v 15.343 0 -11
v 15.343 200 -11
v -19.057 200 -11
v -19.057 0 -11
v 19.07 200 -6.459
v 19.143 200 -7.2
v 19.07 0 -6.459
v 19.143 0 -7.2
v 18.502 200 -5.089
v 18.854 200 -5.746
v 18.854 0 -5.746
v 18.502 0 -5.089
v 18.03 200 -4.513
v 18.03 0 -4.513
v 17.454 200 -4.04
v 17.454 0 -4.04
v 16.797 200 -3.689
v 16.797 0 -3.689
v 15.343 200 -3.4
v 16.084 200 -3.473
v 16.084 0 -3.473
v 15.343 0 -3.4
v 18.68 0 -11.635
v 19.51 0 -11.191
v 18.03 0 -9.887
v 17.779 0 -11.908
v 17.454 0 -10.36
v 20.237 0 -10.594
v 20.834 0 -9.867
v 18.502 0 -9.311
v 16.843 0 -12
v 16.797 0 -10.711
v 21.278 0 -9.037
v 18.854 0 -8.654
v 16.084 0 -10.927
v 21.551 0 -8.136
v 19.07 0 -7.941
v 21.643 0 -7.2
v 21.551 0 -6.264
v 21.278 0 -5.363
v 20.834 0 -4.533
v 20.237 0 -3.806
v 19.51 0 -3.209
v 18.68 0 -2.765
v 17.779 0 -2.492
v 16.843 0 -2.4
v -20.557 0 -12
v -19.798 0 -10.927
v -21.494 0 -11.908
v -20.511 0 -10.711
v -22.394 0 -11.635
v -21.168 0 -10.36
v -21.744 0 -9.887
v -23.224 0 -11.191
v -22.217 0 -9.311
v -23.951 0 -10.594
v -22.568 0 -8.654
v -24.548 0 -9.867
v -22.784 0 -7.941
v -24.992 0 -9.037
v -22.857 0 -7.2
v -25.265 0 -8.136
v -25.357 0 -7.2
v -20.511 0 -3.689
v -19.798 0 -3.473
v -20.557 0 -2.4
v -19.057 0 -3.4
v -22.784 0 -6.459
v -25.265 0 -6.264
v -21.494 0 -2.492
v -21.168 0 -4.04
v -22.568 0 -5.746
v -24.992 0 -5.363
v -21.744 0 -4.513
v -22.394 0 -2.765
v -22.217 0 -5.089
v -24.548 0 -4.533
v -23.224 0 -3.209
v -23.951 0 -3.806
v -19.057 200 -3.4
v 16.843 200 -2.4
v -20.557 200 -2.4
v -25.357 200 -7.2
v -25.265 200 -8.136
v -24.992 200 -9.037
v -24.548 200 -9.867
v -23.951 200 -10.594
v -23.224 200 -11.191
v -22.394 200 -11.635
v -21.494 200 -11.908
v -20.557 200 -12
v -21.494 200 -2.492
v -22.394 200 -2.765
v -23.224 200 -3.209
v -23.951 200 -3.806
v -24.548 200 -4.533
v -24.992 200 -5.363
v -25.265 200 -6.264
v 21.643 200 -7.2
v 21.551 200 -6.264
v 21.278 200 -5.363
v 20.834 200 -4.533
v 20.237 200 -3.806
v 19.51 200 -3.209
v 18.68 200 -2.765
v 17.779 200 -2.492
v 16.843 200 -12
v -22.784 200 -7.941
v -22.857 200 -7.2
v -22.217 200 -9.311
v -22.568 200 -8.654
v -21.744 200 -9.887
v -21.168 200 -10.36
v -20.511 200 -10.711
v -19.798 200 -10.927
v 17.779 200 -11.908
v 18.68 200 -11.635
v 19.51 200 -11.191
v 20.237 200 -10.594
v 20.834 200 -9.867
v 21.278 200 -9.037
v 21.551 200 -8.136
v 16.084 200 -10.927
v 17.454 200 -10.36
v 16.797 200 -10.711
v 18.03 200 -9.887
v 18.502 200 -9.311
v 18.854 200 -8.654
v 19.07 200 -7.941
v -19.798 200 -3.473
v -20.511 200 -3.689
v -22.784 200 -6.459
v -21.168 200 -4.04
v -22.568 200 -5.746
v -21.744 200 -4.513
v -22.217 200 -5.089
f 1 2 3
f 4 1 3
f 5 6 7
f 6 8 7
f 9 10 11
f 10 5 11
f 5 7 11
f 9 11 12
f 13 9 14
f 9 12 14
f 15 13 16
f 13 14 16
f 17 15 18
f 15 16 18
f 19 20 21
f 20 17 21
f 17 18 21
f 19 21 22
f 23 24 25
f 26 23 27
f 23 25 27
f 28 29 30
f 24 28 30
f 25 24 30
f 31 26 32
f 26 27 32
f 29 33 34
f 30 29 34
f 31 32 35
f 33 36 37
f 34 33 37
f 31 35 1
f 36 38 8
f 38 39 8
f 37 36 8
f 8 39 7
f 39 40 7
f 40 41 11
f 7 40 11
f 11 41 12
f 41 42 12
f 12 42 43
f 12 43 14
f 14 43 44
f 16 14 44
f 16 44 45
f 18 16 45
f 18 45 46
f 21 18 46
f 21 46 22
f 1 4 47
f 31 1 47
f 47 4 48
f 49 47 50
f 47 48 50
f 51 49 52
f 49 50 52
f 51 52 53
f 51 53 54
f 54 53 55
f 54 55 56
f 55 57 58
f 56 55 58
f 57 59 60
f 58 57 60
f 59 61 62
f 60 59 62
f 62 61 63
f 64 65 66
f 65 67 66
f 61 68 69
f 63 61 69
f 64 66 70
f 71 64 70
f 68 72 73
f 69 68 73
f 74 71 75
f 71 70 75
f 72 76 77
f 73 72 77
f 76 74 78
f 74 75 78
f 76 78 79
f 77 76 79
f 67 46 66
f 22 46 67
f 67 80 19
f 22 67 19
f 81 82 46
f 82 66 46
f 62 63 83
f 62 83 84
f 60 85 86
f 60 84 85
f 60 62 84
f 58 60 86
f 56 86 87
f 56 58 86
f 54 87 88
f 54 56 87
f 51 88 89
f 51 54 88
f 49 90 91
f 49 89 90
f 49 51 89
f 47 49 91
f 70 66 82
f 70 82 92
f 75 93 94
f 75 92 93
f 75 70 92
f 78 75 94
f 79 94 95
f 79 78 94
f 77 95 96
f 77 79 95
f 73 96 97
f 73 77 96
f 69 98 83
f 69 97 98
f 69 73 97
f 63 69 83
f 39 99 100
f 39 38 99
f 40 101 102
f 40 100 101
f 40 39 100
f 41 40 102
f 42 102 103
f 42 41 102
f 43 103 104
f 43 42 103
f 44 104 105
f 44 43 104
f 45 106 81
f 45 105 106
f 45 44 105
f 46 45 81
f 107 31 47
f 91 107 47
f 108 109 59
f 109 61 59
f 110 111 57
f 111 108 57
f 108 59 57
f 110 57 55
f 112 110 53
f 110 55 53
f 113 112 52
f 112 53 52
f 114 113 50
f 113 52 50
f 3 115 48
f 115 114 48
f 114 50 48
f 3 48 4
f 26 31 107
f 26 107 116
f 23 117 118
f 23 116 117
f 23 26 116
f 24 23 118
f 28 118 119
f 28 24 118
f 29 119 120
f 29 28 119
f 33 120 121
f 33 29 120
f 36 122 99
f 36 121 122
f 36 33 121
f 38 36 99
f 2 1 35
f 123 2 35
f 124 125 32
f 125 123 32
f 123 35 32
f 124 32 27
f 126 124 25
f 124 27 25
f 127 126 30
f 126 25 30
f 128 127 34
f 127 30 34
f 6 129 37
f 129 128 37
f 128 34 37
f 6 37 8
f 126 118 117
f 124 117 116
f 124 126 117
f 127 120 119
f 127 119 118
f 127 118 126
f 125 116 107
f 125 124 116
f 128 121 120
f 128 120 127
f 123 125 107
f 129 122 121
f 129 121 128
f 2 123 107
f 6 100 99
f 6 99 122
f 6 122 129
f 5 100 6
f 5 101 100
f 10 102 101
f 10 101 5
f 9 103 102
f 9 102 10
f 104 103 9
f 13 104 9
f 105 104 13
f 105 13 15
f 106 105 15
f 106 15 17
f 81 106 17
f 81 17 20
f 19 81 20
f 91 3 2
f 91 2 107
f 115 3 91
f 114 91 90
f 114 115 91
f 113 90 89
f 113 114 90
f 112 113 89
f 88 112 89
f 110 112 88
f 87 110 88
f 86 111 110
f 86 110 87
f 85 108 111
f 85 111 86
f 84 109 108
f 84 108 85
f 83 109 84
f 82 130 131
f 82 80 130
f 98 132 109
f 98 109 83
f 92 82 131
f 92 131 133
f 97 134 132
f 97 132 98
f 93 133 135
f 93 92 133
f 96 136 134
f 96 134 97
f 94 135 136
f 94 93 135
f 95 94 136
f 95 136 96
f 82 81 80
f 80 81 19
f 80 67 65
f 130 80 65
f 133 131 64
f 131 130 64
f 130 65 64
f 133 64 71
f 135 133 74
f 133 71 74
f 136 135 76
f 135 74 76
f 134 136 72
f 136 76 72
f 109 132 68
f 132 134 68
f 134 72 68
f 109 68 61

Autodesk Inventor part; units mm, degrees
ref_plane "YZ Plane" through (0, 0, 0) normal (1, 0, 0) x (0, 1, 0)
ref_plane "XZ Plane" through (0, 0, 0) normal (0, 1, 0) x (-1, 0, 0)
sketch "Эскиз1" plane through (0, 0, 0) normal (0, 1, 0) x (-1, 0, 0)
  line L0 (20.5571, -2.4) -> (-16.8429, -2.4)
  line L1 (-21.6429, -7.2) -> (-21.6429, -7.2)
  line L2 (-16.8429, -12) -> (20.5571, -12)
  line L3 (25.3571, -7.2) -> (25.3571, -7.2)
  arc A0 (25.3571, -7.2) -> (20.5571, -2.4) centre (20.5571, -7.2) ccw
  arc A1 (20.5571, -12) -> (25.3571, -7.2) centre (20.5571, -7.2) ccw
  arc A2 (-16.8429, -2.4) -> (-21.6429, -7.2) centre (-16.8429, -7.2) ccw
  arc A3 (-21.6429, -7.2) -> (-16.8429, -12) centre (-16.8429, -7.2) ccw
  line L4 (19.0571, -3.4) -> (-15.3429, -3.4)
  line L5 (-19.1429, -7.2) -> (-19.1429, -7.2)
  line L6 (-15.3429, -11) -> (19.0571, -11)
  line L7 (22.8571, -7.2) -> (22.8571, -7.2)
  arc A4 (22.8571, -7.2) -> (19.0571, -3.4) centre (19.0571, -7.2) ccw
  arc A5 (19.0571, -11) -> (22.8571, -7.2) centre (19.0571, -7.2) ccw
  arc A6 (-19.1429, -7.2) -> (-15.3429, -11) centre (-15.3429, -7.2) ccw
  arc A7 (-15.3429, -3.4) -> (-19.1429, -7.2) centre (-15.3429, -7.2) ccw
  point P0 (0, 0)
  point P1 (25.3571, -2.4)
  point P2 (-21.6429, -2.4)
  dimension "d0" = 47
  dimension "d1" = 9.6
  dimension "d2" = 4.8
  dimension "d3" = 1
  dimension "d4" = 1
  dimension "d5" = 2.5
  dimension "d6" = 2.5
  dimension "d7" = 3.8
extrude "Выдавливание1" add sketch "Эскиз1" along normal blind 200
ref_plane "РабПлоскость1" through (0, 210, 0) normal (0, 1, 0) x (1, 0, 0)
properties part number "isolator"
